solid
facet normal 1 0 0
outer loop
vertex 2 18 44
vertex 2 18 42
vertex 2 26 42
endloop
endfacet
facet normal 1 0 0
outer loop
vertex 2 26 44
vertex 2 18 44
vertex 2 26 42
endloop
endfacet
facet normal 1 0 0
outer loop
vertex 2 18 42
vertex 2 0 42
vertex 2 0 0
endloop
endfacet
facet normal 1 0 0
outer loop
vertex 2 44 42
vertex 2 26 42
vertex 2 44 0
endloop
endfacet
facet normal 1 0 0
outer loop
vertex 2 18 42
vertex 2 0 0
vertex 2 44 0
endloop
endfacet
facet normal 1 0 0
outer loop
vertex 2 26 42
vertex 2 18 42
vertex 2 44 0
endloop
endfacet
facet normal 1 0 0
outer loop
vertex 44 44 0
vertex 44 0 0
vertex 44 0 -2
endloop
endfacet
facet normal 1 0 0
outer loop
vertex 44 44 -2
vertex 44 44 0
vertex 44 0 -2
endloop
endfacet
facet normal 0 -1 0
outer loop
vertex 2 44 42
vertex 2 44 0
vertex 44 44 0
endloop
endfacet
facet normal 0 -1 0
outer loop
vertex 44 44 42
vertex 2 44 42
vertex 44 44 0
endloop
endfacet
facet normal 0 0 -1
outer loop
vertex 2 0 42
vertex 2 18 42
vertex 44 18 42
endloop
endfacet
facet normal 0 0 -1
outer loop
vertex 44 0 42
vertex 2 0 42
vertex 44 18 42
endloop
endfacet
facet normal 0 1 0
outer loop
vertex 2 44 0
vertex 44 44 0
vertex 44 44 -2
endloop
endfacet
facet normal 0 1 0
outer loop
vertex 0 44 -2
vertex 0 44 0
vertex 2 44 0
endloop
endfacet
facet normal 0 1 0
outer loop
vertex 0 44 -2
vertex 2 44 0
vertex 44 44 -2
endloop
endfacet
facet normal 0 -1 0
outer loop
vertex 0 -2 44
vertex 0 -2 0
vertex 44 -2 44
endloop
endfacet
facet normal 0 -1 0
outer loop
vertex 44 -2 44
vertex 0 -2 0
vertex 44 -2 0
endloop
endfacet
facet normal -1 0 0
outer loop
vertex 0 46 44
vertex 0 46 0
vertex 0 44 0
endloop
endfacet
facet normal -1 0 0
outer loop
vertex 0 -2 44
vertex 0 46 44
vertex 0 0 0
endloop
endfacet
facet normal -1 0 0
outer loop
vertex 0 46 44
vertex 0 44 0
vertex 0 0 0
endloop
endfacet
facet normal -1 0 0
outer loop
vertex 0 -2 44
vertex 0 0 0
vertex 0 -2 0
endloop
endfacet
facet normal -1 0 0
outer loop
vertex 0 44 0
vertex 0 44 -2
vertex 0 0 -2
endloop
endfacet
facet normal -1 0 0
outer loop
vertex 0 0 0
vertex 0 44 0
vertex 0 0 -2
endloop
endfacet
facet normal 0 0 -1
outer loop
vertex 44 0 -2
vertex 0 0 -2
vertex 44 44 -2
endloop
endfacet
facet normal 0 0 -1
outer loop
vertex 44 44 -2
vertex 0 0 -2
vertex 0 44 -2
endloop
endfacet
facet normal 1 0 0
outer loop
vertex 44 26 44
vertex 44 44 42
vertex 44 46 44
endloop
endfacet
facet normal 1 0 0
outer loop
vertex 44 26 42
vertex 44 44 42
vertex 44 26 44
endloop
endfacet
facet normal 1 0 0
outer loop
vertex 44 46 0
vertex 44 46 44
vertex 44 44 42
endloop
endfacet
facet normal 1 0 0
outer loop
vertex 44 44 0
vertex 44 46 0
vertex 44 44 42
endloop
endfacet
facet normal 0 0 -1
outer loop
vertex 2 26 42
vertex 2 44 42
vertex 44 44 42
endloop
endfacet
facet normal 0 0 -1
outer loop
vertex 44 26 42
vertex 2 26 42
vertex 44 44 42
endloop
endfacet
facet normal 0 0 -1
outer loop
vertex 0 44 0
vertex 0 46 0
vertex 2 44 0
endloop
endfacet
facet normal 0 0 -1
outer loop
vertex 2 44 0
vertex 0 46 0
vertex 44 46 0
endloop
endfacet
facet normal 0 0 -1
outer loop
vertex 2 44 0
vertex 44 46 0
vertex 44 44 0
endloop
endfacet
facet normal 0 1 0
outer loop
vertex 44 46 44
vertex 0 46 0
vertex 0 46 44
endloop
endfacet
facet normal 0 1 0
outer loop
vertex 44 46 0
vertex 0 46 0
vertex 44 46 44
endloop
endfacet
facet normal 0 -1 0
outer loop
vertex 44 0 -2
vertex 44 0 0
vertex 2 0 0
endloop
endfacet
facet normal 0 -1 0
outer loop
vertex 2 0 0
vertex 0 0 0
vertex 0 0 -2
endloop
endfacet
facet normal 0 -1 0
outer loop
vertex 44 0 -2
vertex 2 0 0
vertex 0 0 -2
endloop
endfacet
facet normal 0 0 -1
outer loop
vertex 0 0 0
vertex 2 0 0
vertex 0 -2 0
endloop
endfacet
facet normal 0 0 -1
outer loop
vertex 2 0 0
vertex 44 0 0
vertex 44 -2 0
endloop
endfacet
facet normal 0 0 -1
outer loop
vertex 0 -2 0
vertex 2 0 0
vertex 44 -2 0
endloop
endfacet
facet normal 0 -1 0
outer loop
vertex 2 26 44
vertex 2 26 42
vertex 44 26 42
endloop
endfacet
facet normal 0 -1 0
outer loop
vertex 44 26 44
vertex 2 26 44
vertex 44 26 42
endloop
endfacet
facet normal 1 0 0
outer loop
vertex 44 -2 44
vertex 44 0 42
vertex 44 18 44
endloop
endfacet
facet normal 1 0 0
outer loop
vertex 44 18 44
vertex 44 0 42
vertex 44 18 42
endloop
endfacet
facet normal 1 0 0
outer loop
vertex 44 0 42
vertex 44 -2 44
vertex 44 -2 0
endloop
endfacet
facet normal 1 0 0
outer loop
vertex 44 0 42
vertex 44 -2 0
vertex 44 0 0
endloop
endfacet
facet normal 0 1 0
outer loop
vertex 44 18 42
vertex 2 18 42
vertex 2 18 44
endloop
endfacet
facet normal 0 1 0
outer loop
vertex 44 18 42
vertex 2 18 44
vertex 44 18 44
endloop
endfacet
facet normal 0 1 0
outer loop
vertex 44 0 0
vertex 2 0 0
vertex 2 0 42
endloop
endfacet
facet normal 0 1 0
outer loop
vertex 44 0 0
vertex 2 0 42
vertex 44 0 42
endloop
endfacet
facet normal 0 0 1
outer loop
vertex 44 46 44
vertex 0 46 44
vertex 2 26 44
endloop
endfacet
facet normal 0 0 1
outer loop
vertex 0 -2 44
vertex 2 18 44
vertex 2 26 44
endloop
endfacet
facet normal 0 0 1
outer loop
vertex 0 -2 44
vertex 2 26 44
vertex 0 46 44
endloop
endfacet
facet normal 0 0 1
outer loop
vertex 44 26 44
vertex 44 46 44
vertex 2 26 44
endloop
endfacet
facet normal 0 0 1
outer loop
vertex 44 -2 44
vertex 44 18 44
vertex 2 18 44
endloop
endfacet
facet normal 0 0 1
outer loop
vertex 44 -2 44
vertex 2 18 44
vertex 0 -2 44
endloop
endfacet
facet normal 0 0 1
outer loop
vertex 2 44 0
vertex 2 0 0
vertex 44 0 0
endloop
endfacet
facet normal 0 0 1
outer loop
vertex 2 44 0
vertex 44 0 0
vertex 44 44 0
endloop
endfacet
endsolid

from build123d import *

# Parameters (mm, degrees)
BOX005_W     = 42
BOX005_H     = 8
BOX005_DEPTH = 2
BOX004_W     = 42
BOX004_H     = 44
BOX004_DEPTH = 2
BOX001_W     = 2
BOX001_H     = 44
BOX001_DEPTH = 44
BOX002_W     = 2
BOX002_H     = 44
BOX002_DEPTH = 44
BOX003_W     = 2
BOX003_H     = 44
BOX003_DEPTH = 44
BOX_W        = 2
BOX_H        = 44
BOX_DEPTH    = 44


with BuildPart() as cubo005:
    # Box005 → Box005 (new body)
    with BuildSketch(Plane(origin=(2, 18, 42), x_dir=(1, 0, 0), z_dir=(0, 0, 1))):
        with Locations((21, 4)):
            Rectangle(BOX005_W, BOX005_H)
    extrude(amount=BOX005_DEPTH)


with BuildPart() as cut:
    # Box004 → Box004 (new body)
    with BuildSketch(Plane(origin=(2, 0, 42), x_dir=(1, 0, 0), z_dir=(0, 0, 1))):
        with Locations((21, 22)):
            Rectangle(BOX004_W, BOX004_H)
    extrude(amount=BOX004_DEPTH)

    # Cut: cut Cubo005
    add(cubo005.part, mode=Mode.SUBTRACT)


with BuildPart() as cubo001:
    # Box001 → Box001 (new body)
    with BuildSketch(Plane(origin=(0, 0, 0), x_dir=(0, -1, 0), z_dir=(0, 0, 1))):
        with Locations((1, 22)):
            Rectangle(BOX001_W, BOX001_H)
    extrude(amount=BOX001_DEPTH)


with BuildPart() as cubo002:
    # Box002 → Box002 (new body)
    with BuildSketch(Plane(origin=(0, 46, 0), x_dir=(0, -1, 0), z_dir=(0, 0, 1))):
        with Locations((1, 22)):
            Rectangle(BOX002_W, BOX002_H)
    extrude(amount=BOX002_DEPTH)


with BuildPart() as cubo003:
    # Box003 → Box003 (new body)
    with BuildSketch(Plane(origin=(0, 0, 0), x_dir=(0, 0, -1), z_dir=(1, 0, 0))):
        with Locations((1, 22)):
            Rectangle(BOX003_W, BOX003_H)
    extrude(amount=BOX003_DEPTH)


with BuildPart() as fusion002:
    # Box → Box (new body)
    with BuildSketch(Plane.XY):
        with Locations((1, 22)):
            Rectangle(BOX_W, BOX_H)
    extrude(amount=BOX_DEPTH)

    # Fusion: union Cubo001, Cubo002, Cubo003
    add(cubo001.part)
    add(cubo002.part)
    add(cubo003.part)

    # Fusion002: union Cut
    add(cut.part)


solid = fusion002.part
